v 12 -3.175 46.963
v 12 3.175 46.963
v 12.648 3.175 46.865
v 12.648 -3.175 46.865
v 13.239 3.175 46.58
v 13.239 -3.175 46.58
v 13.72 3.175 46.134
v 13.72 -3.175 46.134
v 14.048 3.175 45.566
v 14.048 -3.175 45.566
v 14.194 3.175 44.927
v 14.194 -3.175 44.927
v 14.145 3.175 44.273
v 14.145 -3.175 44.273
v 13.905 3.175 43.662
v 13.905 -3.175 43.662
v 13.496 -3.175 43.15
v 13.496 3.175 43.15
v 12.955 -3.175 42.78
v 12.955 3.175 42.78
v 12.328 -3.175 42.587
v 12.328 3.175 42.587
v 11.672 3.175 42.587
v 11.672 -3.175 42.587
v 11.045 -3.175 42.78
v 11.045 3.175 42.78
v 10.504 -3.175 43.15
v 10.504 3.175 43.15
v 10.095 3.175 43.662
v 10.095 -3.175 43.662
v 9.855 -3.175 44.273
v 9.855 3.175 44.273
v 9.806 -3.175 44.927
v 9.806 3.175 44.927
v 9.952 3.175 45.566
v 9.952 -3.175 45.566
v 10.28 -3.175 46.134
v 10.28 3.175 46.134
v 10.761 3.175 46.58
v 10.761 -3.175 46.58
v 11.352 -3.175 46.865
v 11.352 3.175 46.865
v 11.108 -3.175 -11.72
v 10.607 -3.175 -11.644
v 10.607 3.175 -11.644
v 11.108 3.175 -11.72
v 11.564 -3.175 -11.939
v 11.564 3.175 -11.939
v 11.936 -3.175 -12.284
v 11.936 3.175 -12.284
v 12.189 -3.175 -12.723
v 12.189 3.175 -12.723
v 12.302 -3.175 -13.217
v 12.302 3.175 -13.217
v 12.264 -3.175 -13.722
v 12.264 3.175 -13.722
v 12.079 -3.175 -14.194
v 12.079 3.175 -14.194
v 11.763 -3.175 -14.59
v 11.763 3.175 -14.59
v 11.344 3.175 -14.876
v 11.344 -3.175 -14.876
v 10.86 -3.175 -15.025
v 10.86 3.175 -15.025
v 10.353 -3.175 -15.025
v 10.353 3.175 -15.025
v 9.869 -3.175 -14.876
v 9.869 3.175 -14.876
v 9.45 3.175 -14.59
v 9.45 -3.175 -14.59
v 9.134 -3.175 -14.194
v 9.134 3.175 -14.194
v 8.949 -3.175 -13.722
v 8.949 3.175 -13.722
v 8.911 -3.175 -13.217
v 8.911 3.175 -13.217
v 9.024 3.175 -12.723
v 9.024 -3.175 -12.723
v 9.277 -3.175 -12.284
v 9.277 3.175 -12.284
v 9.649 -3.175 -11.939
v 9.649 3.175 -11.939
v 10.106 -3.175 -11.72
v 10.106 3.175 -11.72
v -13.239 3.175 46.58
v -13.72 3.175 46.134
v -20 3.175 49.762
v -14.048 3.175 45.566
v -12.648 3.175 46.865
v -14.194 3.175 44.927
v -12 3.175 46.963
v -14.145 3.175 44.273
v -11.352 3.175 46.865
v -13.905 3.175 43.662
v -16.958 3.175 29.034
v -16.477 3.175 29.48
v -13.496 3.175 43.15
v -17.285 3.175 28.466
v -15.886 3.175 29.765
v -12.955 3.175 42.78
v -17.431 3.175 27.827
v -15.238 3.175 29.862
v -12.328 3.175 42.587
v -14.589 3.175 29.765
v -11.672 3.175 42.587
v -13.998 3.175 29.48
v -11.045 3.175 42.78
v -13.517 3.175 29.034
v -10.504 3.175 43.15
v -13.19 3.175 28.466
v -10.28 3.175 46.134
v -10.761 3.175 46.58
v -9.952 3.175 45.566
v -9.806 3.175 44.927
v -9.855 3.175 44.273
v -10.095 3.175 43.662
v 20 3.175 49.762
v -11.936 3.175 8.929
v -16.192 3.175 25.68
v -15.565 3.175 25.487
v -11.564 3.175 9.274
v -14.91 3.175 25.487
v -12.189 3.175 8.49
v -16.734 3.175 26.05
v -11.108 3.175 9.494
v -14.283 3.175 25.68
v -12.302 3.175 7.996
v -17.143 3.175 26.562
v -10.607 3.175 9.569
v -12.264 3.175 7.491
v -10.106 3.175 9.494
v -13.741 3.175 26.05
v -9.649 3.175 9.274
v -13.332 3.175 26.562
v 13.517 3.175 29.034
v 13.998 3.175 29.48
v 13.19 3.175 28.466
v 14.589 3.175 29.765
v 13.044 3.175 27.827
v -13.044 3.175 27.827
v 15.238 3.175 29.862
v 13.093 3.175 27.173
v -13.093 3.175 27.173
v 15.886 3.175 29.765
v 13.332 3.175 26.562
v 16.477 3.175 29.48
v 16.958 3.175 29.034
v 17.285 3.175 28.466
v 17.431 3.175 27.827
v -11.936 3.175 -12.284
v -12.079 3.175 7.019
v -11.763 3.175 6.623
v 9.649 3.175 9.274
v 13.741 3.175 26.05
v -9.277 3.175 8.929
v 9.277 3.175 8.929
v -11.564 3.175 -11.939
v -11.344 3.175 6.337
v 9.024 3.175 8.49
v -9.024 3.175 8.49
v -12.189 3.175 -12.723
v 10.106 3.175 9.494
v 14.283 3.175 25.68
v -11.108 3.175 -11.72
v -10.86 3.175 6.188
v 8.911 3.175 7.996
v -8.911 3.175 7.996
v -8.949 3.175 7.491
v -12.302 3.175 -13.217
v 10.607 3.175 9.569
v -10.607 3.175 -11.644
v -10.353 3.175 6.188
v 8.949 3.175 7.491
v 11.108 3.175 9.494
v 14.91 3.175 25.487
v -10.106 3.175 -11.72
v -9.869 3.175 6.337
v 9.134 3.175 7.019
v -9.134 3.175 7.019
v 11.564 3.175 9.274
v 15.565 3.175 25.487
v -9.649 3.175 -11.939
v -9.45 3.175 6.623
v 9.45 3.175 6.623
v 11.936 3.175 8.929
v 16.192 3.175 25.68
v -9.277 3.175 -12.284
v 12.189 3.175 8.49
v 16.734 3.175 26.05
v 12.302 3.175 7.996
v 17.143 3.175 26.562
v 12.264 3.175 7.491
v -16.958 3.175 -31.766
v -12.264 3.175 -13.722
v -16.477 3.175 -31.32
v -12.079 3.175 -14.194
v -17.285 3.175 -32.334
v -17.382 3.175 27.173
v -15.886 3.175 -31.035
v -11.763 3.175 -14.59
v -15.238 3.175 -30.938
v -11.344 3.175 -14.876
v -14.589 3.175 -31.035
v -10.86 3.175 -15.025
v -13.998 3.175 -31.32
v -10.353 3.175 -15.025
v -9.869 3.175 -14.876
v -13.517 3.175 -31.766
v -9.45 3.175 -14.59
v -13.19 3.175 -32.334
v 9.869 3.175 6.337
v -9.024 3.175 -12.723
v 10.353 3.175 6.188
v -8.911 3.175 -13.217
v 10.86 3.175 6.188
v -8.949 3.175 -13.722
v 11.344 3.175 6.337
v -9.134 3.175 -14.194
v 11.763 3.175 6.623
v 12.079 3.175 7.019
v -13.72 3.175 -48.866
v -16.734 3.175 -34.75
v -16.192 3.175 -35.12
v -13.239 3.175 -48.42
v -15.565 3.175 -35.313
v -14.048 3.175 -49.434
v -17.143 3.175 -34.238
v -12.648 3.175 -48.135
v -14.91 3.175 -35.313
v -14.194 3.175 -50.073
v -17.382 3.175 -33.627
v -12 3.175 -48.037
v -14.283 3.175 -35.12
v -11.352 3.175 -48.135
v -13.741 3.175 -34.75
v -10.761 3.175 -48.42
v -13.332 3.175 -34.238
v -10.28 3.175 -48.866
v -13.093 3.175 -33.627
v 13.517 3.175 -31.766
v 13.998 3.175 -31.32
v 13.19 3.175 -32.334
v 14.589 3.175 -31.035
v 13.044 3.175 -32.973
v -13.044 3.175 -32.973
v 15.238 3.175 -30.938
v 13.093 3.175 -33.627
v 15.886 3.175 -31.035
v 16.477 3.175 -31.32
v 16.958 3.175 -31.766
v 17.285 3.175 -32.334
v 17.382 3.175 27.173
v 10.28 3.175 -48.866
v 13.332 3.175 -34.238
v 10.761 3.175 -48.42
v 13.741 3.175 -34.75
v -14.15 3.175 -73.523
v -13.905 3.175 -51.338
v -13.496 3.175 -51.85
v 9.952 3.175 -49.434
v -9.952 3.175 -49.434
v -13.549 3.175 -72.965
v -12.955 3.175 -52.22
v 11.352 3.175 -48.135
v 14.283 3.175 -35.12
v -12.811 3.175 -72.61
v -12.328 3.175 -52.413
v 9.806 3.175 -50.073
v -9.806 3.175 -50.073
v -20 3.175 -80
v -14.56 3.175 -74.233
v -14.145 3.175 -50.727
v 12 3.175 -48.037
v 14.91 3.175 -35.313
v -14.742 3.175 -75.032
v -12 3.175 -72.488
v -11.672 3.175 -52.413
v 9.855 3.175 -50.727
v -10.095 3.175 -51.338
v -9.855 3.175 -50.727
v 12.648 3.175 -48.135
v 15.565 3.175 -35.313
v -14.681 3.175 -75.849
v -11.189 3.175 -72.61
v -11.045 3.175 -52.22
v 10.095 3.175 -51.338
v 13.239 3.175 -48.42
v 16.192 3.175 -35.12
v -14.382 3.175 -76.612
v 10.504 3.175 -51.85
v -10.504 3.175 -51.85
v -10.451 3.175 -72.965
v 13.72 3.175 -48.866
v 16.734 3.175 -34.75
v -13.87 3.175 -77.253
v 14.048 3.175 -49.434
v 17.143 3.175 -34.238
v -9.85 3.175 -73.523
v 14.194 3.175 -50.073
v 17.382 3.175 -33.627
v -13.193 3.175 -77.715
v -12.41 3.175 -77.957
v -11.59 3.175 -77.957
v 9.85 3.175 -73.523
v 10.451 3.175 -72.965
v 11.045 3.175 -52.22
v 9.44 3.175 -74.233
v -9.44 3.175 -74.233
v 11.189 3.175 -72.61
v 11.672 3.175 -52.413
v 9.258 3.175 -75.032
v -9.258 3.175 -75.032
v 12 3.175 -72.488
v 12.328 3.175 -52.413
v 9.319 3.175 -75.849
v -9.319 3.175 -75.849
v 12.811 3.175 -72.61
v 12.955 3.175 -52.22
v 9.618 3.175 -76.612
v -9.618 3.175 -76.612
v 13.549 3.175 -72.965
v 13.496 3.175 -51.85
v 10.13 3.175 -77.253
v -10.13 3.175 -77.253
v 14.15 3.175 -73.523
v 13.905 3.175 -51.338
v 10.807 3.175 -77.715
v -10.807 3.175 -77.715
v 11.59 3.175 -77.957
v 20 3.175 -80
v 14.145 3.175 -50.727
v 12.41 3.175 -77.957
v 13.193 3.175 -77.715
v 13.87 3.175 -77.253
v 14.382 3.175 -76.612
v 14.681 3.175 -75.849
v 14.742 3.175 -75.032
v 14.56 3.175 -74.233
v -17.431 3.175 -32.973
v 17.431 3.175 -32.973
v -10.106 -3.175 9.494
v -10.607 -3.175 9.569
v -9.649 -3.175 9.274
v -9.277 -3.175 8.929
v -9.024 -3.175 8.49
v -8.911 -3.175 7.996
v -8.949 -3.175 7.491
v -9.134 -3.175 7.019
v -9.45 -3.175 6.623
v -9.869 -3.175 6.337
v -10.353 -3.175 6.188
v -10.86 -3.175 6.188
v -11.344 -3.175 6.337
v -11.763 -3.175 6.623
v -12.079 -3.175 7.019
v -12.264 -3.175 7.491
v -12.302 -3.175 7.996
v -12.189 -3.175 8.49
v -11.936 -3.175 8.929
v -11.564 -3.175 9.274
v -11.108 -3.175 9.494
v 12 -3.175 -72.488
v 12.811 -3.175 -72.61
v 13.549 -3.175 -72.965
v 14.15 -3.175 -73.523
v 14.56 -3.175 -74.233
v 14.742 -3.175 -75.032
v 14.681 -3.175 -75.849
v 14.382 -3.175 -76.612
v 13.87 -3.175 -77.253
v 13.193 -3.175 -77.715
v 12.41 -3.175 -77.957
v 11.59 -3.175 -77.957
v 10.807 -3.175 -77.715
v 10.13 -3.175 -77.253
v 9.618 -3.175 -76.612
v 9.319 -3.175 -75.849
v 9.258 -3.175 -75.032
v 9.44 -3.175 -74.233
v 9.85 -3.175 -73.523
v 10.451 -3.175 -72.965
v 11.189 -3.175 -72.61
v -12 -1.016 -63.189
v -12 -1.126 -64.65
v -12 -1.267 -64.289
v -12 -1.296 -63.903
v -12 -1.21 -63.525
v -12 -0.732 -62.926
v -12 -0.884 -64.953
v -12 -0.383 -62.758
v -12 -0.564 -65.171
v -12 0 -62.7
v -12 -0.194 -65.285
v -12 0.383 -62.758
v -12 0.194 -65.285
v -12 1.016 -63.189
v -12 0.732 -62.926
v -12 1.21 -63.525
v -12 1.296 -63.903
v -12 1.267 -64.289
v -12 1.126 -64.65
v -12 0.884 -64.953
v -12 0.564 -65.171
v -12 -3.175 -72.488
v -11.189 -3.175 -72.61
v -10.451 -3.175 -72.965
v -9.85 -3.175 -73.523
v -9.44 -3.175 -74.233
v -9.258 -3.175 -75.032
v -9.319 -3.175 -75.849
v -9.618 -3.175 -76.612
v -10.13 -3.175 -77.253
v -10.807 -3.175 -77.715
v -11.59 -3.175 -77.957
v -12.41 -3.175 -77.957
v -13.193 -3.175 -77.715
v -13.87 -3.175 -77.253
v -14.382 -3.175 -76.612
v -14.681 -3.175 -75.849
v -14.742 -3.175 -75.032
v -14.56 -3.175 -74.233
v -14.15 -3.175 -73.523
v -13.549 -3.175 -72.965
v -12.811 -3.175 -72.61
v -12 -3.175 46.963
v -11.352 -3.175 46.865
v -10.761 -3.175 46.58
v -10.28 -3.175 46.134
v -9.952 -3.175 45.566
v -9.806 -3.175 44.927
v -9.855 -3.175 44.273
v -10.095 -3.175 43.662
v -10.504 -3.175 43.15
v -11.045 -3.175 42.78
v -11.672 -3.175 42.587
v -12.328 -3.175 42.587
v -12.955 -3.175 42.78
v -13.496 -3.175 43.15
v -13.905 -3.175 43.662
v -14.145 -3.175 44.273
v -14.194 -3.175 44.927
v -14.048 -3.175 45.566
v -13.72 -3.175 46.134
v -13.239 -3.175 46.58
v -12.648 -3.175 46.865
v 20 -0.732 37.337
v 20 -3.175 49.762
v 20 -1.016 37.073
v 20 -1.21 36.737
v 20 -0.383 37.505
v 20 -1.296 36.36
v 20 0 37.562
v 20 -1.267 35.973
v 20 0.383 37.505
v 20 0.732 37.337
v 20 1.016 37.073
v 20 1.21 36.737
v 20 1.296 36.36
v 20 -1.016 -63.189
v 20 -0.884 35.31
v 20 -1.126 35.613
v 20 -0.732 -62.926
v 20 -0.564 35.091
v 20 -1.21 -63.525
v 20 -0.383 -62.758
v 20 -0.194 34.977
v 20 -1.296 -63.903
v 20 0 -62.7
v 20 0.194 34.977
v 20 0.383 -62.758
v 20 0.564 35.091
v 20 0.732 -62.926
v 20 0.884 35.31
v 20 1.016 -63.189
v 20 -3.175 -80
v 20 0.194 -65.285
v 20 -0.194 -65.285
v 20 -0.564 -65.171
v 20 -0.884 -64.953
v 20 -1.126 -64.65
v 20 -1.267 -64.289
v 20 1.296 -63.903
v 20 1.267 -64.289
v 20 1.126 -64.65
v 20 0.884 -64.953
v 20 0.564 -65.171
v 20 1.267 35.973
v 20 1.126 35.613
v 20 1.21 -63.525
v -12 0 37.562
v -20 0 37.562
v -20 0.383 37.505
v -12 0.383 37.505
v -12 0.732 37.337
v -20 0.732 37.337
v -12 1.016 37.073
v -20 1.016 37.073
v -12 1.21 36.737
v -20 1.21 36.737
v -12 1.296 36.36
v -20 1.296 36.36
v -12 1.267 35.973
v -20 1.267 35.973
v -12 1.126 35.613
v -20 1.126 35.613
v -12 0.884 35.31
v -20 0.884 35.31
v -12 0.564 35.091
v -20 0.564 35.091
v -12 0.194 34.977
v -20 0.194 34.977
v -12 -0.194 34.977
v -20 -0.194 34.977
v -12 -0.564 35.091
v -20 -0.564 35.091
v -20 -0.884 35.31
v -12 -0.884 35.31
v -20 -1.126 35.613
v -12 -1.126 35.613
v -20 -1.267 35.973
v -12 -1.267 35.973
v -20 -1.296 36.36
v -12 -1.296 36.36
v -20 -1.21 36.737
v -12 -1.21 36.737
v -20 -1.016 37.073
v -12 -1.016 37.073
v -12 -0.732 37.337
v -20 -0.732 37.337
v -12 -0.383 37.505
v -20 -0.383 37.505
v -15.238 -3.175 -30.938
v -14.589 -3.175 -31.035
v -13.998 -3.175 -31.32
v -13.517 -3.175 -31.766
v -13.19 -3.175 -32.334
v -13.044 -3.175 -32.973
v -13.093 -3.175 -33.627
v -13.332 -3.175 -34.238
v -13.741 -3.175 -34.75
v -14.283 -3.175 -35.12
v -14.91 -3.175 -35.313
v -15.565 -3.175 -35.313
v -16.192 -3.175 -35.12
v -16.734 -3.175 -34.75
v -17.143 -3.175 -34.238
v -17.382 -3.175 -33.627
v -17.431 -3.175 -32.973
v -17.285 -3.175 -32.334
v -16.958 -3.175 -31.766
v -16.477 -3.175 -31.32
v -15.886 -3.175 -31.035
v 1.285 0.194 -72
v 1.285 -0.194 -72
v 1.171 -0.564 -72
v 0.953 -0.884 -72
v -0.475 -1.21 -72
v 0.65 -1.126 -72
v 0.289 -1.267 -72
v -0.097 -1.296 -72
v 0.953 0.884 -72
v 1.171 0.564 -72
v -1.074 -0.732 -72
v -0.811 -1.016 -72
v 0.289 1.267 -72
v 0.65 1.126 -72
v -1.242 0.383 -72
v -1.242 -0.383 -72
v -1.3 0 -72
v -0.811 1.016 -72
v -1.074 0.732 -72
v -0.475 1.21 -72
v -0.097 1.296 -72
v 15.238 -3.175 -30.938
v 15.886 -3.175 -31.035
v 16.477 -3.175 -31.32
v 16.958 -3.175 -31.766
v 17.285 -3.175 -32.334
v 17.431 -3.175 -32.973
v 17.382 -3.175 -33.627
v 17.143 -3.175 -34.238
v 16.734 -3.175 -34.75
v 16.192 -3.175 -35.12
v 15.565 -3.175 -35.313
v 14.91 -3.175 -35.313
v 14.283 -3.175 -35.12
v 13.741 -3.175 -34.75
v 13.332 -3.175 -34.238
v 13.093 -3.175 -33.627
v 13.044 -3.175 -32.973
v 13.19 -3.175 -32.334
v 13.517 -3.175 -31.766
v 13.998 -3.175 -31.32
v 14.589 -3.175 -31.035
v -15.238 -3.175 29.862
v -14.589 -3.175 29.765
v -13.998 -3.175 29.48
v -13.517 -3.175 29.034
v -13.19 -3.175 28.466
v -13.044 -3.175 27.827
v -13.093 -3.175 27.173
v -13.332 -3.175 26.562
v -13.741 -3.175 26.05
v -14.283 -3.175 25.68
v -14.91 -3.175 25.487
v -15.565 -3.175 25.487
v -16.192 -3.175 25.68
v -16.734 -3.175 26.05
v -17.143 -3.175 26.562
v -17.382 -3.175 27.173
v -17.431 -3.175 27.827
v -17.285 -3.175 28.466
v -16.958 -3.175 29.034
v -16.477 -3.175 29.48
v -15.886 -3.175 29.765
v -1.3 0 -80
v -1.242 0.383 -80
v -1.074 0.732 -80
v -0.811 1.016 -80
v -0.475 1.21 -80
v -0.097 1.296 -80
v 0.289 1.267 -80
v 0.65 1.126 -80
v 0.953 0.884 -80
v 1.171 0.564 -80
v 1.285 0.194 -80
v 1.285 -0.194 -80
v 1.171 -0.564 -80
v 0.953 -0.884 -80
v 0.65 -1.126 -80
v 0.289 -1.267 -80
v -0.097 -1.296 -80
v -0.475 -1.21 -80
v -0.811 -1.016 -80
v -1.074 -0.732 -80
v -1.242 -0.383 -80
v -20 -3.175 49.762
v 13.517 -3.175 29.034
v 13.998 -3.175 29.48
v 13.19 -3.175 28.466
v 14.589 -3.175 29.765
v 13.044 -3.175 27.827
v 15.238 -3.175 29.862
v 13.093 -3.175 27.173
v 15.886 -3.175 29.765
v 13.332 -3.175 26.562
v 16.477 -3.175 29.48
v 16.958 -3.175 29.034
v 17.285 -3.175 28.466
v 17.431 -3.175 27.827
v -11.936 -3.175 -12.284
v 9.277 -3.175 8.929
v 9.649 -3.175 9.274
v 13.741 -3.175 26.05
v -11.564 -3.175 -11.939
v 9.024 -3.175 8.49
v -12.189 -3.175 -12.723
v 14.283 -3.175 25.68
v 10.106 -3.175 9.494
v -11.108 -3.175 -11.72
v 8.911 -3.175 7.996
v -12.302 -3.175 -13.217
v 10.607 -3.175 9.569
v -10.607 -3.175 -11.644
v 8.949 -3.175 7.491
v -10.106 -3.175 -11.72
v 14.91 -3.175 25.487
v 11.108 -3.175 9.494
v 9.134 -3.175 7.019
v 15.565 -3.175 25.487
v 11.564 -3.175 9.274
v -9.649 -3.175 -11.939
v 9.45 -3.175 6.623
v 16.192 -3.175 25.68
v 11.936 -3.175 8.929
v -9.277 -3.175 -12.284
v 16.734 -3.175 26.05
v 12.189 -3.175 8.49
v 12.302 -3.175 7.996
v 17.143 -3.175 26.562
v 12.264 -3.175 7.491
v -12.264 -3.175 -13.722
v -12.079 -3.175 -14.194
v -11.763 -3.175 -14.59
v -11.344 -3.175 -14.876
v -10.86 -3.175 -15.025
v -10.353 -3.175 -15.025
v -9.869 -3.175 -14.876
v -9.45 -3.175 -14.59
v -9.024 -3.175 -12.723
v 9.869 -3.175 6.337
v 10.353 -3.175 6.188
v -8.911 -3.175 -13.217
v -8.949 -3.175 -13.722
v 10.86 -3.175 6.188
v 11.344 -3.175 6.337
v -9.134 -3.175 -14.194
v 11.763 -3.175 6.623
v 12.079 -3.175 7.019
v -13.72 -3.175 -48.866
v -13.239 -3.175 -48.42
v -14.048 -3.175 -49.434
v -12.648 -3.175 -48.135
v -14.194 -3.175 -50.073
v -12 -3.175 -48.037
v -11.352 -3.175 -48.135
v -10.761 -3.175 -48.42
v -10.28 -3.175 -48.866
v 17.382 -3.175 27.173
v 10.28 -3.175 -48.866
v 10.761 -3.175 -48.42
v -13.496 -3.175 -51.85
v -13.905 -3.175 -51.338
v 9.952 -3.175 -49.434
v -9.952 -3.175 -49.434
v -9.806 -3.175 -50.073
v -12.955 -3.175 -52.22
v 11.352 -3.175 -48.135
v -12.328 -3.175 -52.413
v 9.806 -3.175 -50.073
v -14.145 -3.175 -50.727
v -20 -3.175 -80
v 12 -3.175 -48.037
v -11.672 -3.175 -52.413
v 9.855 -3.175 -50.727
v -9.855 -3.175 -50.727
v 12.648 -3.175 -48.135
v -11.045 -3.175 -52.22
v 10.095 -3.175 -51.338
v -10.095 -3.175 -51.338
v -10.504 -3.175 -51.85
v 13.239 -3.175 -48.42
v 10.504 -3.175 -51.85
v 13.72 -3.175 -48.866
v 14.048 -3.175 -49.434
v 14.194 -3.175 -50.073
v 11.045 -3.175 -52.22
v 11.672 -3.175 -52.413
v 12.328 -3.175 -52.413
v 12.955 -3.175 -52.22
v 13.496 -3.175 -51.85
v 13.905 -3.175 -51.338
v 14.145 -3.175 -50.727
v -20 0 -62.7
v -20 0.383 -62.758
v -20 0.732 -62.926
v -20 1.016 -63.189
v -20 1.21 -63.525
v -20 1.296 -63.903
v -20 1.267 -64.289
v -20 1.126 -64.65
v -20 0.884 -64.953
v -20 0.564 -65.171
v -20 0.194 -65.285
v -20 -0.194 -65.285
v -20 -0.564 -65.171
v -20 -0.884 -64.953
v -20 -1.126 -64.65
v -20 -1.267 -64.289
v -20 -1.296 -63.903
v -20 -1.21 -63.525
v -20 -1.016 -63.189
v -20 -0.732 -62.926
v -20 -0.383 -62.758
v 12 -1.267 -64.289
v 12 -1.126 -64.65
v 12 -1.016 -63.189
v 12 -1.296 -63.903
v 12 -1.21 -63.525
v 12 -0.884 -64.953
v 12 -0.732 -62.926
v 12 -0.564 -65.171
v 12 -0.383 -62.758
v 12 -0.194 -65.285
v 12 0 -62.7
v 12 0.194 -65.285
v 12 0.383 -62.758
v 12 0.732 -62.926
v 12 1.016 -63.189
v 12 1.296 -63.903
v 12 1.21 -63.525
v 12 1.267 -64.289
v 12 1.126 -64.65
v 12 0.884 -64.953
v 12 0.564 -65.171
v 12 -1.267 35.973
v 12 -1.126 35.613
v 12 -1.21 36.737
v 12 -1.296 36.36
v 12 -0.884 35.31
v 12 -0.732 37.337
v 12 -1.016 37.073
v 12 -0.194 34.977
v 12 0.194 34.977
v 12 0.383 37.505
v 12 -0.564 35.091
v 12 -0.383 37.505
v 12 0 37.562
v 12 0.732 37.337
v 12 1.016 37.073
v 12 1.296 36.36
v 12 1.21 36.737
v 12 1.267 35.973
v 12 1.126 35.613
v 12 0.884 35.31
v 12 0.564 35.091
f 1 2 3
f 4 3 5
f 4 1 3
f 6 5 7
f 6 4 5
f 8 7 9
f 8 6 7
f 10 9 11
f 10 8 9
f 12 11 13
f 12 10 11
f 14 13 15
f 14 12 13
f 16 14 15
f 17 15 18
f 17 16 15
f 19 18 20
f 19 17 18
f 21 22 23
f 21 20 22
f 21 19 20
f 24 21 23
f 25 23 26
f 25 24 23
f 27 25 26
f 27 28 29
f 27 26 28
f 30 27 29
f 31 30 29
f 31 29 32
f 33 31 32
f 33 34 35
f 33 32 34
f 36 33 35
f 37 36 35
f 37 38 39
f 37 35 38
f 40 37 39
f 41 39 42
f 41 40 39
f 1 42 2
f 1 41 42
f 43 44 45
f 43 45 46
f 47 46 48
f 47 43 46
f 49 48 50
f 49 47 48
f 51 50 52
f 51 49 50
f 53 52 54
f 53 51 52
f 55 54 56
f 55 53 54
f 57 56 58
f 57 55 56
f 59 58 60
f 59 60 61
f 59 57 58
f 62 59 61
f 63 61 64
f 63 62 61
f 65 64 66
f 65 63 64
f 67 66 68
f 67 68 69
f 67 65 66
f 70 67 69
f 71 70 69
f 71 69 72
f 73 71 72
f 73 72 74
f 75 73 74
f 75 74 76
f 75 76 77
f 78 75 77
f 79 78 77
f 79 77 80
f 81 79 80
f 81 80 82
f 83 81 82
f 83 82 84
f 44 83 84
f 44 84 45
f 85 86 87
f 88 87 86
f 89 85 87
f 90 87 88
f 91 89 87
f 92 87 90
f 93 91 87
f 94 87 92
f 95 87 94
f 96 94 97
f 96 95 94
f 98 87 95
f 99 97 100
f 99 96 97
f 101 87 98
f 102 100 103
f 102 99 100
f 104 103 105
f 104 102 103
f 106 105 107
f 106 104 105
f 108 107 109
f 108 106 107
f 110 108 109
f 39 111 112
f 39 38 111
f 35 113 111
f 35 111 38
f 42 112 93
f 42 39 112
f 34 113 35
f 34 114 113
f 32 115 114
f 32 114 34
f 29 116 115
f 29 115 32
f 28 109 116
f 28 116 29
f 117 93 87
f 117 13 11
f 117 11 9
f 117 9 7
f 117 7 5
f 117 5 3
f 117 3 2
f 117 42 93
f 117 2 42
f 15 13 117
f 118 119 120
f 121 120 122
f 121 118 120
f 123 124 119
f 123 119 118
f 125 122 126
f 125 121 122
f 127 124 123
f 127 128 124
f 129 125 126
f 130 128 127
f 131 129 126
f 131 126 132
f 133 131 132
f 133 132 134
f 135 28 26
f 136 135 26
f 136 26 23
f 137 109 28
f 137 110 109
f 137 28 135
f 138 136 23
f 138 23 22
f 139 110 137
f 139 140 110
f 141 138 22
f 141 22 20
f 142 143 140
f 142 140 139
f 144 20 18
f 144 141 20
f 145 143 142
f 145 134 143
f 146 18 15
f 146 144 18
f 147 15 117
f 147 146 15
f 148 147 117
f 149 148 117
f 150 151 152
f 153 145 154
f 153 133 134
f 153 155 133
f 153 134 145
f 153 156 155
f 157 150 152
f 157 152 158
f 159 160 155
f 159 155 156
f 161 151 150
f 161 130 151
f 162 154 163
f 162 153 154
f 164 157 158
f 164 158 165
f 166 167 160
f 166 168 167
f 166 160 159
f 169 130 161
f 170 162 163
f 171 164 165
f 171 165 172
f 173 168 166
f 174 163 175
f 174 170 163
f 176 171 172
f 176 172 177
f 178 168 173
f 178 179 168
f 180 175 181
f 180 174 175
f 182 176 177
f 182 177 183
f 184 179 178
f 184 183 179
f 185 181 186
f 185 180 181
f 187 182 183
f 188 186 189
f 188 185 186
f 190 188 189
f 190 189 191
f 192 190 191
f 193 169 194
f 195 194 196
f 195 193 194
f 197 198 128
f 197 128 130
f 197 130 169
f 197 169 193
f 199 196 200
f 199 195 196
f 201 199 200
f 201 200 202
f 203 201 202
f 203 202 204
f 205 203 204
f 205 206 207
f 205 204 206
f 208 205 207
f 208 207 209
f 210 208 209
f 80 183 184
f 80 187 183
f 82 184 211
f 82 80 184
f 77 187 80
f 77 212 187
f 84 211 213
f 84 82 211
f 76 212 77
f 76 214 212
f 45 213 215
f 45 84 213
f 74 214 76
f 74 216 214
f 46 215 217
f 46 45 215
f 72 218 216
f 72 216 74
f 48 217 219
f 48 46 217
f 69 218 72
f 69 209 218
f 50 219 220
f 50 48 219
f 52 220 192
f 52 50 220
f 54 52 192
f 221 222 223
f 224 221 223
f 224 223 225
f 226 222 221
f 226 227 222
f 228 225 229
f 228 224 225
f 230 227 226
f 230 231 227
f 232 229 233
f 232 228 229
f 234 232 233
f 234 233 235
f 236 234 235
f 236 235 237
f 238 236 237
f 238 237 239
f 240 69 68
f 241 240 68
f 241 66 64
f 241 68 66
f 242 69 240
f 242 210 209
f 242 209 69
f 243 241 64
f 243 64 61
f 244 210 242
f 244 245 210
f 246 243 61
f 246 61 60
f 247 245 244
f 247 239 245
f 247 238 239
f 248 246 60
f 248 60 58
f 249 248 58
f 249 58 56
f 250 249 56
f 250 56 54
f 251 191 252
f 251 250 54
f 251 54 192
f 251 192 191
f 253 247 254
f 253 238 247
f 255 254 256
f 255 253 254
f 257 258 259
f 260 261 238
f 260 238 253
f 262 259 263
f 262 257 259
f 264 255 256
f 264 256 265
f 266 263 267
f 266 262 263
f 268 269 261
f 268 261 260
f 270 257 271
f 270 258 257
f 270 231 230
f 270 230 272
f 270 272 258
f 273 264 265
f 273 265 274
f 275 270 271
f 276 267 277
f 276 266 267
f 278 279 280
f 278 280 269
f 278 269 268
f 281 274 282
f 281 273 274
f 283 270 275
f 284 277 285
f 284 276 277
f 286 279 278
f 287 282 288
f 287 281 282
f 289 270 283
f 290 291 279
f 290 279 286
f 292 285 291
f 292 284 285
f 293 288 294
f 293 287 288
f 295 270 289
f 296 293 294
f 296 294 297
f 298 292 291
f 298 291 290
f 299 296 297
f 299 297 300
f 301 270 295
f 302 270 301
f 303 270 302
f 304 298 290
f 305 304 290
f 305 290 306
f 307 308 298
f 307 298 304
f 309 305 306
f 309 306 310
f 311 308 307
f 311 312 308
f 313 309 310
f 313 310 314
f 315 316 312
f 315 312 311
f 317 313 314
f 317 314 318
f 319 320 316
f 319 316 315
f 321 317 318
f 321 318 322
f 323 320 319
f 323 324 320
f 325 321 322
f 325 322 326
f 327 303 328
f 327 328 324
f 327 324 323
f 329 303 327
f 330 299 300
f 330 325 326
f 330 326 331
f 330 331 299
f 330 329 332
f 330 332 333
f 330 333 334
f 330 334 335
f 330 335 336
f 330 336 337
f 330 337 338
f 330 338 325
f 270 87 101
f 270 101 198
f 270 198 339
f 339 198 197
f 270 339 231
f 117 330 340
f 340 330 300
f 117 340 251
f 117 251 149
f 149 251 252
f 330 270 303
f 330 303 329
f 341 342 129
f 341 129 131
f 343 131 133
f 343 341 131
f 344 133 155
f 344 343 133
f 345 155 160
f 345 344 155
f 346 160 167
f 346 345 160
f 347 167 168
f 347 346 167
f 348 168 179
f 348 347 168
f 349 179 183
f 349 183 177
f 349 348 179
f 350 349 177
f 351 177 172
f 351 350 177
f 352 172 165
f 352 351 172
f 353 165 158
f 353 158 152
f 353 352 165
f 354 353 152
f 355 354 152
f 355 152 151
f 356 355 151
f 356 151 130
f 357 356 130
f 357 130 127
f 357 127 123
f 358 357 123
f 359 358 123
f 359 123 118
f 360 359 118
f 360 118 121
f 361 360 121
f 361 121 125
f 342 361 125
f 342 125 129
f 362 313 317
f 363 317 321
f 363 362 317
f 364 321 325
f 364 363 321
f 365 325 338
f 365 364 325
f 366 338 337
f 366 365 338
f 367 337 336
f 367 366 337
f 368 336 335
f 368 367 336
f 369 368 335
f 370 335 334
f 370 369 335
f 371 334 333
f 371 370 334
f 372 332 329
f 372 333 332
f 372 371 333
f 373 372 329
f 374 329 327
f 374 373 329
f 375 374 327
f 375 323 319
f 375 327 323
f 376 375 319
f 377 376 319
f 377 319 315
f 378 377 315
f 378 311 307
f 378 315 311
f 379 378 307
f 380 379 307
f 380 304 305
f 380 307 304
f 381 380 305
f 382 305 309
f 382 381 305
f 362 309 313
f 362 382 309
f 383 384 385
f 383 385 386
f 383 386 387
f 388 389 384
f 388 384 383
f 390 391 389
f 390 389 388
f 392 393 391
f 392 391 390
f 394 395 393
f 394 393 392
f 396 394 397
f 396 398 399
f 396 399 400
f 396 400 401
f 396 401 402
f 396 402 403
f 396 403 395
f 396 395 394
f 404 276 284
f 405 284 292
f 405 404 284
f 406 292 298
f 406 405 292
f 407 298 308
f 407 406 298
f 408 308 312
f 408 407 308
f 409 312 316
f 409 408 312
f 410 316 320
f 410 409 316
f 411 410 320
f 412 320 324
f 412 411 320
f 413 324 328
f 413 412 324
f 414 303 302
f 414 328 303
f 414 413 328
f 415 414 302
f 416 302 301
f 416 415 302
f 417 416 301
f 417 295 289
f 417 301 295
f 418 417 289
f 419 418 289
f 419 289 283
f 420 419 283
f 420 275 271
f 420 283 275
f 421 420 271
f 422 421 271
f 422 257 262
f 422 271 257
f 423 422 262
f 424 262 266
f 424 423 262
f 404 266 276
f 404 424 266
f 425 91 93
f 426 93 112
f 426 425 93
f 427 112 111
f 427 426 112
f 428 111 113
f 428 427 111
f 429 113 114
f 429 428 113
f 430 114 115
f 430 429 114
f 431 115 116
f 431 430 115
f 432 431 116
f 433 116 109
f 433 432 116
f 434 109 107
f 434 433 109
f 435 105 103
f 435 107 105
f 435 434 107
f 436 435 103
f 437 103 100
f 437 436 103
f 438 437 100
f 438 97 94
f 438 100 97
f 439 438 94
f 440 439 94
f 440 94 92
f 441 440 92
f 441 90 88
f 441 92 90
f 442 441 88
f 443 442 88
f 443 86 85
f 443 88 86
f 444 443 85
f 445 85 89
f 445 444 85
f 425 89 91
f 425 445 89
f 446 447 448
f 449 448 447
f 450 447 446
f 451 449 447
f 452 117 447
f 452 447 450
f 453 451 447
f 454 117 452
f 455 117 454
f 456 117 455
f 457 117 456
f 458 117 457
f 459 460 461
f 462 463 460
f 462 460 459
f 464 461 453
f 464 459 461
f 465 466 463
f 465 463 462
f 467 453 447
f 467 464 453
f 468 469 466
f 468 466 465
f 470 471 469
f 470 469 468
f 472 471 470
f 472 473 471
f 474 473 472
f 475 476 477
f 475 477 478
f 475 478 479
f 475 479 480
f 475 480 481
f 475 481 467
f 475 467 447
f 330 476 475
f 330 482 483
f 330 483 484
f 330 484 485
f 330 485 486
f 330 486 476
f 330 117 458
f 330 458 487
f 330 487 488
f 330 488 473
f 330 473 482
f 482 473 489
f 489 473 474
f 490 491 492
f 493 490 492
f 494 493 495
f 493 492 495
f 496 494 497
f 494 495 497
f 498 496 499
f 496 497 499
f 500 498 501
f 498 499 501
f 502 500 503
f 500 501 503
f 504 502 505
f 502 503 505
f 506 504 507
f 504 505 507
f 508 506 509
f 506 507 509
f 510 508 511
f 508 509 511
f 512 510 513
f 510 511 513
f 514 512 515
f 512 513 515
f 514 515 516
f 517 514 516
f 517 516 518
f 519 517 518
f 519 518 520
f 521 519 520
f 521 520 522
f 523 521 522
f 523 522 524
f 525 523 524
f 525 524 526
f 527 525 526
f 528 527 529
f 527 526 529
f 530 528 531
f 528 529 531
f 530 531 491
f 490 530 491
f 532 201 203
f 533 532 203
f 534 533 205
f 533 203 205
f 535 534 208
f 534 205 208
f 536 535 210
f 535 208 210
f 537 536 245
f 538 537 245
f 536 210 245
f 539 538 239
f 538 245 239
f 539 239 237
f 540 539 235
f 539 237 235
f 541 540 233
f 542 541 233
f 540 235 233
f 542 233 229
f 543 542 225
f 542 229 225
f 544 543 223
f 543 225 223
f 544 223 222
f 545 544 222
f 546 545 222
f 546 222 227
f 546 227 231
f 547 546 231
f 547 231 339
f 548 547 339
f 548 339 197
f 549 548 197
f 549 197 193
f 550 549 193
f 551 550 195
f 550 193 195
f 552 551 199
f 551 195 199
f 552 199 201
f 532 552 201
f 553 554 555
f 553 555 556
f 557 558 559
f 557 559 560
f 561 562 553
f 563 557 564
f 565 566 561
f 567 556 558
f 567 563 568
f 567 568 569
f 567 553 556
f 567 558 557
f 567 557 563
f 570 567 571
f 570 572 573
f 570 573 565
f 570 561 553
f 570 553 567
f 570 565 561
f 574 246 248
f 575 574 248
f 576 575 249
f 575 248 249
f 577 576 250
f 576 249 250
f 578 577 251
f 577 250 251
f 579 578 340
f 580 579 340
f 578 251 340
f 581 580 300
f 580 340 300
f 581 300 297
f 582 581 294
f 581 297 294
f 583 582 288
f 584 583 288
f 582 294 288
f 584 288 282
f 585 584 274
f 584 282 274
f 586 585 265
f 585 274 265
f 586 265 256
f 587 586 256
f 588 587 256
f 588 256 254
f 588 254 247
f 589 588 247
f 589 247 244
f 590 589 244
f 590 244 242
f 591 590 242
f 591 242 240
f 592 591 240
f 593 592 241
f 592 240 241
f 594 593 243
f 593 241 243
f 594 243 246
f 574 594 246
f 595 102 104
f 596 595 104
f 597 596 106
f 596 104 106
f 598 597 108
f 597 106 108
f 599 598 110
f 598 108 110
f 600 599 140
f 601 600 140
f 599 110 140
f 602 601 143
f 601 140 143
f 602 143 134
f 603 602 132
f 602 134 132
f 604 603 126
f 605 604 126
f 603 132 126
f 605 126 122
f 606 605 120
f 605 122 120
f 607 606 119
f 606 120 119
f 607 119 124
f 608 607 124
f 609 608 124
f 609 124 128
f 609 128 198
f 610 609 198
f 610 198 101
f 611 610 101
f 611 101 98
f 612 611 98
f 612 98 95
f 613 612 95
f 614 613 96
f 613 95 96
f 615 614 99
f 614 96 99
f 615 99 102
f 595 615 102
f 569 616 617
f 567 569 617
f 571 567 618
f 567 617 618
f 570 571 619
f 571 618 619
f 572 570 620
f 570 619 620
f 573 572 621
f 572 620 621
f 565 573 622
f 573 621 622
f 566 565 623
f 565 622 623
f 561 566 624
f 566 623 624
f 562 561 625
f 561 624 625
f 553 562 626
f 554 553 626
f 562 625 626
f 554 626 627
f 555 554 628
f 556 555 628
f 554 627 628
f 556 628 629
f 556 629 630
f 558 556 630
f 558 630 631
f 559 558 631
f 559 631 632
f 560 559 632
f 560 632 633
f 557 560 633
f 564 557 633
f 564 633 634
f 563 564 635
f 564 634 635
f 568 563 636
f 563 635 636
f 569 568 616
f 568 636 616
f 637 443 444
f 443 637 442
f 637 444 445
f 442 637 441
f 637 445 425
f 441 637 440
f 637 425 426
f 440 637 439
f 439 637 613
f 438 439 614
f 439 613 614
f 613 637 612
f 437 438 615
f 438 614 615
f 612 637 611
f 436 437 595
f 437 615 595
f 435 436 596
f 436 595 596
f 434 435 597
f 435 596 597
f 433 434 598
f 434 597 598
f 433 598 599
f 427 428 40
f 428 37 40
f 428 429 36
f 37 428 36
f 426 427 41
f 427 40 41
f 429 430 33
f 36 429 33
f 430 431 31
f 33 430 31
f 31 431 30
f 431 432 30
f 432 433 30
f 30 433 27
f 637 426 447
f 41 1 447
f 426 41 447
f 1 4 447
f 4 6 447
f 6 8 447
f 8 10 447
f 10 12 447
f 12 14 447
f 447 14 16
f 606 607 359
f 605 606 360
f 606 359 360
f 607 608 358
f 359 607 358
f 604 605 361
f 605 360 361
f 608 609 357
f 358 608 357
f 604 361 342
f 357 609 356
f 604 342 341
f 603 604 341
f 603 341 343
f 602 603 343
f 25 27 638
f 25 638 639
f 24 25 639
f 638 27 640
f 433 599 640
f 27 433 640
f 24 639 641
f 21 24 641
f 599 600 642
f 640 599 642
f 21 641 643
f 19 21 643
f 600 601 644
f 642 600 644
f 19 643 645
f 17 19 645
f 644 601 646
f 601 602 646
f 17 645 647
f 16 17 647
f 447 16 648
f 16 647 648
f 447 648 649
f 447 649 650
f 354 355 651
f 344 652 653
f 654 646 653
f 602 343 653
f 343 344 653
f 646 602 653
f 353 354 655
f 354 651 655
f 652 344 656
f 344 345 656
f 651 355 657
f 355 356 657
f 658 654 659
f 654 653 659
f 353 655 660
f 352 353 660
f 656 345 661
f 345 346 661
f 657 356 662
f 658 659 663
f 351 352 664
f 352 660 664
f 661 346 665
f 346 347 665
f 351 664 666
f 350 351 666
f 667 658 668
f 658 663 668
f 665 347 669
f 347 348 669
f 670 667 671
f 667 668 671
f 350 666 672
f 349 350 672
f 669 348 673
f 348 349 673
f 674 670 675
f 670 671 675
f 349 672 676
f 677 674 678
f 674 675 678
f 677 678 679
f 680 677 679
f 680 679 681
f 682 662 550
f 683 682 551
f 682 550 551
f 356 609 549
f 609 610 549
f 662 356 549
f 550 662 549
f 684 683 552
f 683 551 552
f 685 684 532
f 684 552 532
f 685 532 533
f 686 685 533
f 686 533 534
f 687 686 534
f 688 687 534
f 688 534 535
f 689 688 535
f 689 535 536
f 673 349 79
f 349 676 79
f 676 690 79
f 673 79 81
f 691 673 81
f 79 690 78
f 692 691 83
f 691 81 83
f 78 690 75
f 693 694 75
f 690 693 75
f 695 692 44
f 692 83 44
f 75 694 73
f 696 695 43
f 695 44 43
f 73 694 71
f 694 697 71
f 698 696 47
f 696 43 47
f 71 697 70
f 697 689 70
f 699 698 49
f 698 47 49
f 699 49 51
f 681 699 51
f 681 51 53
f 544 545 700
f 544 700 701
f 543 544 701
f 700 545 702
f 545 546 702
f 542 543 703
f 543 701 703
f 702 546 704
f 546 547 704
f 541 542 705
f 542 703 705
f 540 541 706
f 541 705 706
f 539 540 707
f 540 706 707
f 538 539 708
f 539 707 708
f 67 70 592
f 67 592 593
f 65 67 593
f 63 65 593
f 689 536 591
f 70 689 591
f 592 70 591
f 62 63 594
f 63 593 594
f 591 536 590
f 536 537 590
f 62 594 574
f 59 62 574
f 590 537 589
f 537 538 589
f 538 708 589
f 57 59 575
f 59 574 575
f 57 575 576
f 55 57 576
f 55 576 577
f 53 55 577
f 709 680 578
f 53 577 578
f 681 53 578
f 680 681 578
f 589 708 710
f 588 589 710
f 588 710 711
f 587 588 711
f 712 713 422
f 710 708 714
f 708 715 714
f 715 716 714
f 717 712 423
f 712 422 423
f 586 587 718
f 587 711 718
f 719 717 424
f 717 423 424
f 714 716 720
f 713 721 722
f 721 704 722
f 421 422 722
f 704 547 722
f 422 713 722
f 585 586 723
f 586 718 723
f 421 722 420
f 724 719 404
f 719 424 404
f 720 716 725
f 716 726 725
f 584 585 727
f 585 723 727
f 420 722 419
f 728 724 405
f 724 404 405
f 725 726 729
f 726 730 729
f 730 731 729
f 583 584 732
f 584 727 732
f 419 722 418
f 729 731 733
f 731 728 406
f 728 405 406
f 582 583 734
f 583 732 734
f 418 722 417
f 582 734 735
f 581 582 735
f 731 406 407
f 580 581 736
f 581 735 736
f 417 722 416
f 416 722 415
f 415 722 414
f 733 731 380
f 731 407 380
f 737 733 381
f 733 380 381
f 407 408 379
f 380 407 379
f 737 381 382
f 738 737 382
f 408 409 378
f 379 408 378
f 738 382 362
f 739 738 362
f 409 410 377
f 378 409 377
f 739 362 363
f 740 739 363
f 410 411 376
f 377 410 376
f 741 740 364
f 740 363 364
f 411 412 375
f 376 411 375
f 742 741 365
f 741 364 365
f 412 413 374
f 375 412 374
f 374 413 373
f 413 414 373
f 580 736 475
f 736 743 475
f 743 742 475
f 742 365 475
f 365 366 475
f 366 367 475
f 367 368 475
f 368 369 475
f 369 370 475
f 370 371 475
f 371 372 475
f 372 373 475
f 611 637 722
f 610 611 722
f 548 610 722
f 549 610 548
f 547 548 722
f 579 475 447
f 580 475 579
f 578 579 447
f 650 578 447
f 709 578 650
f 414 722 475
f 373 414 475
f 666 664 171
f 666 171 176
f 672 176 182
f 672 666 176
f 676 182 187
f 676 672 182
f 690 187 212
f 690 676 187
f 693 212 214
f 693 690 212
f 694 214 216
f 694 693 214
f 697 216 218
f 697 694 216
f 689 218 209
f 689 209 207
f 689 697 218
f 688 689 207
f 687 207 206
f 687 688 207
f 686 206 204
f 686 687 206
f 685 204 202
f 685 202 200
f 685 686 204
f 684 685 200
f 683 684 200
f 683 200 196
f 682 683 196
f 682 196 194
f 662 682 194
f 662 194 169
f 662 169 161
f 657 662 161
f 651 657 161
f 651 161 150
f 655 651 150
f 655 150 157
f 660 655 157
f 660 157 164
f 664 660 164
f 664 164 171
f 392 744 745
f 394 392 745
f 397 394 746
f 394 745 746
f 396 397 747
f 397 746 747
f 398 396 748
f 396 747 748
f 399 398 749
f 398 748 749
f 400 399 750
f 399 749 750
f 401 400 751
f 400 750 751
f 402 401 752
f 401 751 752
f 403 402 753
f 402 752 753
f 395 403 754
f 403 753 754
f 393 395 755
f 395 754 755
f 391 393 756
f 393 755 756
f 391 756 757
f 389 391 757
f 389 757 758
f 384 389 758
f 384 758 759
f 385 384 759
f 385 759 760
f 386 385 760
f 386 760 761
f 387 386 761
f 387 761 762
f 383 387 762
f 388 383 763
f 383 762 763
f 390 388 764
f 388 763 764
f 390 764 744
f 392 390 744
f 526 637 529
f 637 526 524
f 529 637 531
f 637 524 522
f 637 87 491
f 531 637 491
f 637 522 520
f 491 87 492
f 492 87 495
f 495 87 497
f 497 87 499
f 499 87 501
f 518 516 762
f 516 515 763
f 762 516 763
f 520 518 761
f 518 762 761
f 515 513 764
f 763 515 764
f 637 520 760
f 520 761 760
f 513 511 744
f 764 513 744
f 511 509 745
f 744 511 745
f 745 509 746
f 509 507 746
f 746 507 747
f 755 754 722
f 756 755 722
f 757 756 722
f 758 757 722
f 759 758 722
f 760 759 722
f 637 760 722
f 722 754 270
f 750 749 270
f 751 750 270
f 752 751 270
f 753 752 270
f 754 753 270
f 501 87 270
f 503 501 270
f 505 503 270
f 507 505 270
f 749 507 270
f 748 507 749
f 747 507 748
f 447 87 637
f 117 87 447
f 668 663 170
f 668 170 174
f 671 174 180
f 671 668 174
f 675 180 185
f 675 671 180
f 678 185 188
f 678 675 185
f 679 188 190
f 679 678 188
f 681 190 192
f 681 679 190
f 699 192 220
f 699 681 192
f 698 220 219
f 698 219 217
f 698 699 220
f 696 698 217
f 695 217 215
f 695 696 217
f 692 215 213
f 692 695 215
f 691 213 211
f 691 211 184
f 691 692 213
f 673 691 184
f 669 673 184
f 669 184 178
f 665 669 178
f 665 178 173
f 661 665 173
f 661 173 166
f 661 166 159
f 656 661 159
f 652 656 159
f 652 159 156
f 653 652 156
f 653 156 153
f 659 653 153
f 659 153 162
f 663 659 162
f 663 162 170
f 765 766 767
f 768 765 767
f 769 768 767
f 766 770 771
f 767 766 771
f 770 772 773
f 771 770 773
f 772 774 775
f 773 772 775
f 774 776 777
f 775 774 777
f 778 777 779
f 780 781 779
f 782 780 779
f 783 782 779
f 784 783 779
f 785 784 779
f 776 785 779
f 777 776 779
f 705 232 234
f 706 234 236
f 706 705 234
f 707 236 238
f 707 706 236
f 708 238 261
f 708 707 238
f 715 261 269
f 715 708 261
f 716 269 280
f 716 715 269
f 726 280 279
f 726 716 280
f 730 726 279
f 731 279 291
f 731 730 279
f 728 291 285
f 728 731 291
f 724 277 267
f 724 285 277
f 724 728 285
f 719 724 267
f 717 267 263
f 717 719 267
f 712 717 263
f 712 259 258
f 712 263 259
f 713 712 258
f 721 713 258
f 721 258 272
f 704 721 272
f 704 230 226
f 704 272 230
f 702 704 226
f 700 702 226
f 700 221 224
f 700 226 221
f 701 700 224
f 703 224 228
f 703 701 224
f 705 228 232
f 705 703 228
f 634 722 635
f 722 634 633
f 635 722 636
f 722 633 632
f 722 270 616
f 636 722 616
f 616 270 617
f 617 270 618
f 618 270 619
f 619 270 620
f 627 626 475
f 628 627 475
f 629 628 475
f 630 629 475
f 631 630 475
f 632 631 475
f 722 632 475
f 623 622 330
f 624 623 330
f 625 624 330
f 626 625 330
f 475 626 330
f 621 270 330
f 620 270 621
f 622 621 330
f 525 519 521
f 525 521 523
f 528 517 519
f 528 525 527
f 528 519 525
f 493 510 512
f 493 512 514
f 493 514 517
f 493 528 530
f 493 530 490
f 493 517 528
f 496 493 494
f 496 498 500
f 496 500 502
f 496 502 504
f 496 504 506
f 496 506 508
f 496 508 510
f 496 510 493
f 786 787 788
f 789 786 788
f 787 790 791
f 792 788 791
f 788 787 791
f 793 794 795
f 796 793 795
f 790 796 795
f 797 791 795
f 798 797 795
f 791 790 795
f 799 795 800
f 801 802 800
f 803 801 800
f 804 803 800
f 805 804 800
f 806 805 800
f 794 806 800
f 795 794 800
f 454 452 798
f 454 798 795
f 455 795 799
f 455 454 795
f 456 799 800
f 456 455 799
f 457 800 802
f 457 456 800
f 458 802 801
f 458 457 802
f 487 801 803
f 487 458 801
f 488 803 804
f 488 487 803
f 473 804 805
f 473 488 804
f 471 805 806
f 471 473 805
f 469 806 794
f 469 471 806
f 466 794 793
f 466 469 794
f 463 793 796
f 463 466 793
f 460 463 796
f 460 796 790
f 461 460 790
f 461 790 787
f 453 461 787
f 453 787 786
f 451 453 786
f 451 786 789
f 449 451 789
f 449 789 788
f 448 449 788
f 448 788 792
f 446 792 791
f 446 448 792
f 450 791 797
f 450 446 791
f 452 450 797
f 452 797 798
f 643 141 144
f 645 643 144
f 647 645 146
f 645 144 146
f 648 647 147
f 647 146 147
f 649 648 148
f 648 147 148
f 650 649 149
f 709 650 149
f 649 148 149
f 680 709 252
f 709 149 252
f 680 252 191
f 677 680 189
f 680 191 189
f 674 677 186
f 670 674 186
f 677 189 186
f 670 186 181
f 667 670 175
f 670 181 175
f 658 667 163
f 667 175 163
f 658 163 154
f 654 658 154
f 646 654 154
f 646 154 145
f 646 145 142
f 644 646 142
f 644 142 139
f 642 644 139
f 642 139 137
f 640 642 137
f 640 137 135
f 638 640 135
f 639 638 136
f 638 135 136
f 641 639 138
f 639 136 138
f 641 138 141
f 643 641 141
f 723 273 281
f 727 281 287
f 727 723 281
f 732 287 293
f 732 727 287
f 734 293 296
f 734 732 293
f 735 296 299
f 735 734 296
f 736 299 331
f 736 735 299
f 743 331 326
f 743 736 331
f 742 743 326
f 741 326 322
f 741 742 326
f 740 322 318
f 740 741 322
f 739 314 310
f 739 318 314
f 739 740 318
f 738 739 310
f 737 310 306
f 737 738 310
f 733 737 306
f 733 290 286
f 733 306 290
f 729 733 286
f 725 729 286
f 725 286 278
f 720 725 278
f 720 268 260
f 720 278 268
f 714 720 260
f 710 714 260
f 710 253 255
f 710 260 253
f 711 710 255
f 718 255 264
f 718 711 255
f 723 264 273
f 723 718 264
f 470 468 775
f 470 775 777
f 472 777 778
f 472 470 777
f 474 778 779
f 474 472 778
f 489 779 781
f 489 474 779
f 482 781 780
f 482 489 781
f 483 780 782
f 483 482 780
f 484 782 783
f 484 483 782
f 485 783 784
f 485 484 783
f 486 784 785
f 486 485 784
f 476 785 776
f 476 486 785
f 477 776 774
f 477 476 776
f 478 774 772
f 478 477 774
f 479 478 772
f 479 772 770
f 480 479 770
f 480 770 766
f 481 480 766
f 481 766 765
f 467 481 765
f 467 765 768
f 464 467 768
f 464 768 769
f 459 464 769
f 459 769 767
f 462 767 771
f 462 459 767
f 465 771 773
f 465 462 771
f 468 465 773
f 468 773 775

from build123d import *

# Parameters (mm, degrees)
SKETCH1_W               = 40
SKETCH1_H               = 160
BOSS_EXTRUDE1_DEPTH     = 3.175
M4_5_THROUGH_DEPTH      = 6.35
M4_5_THROUGH_DEPTH_BACK = 3.175
SKETCH3_R               = 2.75
SKETCH3_R_2             = 2.2
SKETCH4_R               = 1.3
M3_DRILL_DEPTH          = 8
SKETCH5_R               = 2.2
M4_THROUGH_DEPTH        = 6.35
M4_DRILL_DEPTH          = 3.175
M4_DRILL_DEPTH_BACK     = 10
SKETCH6_R               = 1.7
SKETCH7_W               = 40
SKETCH7_H               = 30.2375
CUT_EXTRUDE2_DEPTH      = 6.35
SKETCH8_R               = 1.3
CUT_EXTRUDE3_DEPTH      = 8


with BuildPart() as part:
    # Sketch1 → Boss-Extrude1 (new, symmetric)
    with BuildSketch(Plane(origin=(0, 0, 0), x_dir=(1, 0, 0), z_dir=(0, 1, 0))):
        Rectangle(SKETCH1_W, SKETCH1_H)
    extrude(amount=BOSS_EXTRUDE1_DEPTH, both=True)

    # Sketch3 → M4/5_through (cut, two sides: drawn at the far end of the back side and taken through both)
    with BuildSketch(Plane(origin=(0, 0, 0), x_dir=(1, 0, 0), z_dir=(0, 1, 0)).offset(-M4_5_THROUGH_DEPTH_BACK)):
        with Locations(Location((12, 75.2375, 0), (0, 0, 270))):
            Circle(SKETCH3_R)
        with Locations(Location((12, 50.2375, 0), (0, 0, 270))):
            Circle(SKETCH3_R_2)
        with Locations(Location((-12, 50.2375, 0), (0, 0, 270))):
            Circle(SKETCH3_R_2)
        with Locations(Location((-12, 75.2375, 0), (0, 0, 270))):
            Circle(SKETCH3_R)
        with Locations(Location((-12, -44.7625, 0), (0, 0, 270))):
            Circle(SKETCH3_R_2)
        with Locations(Location((12, -44.7625, 0), (0, 0, 270))):
            Circle(SKETCH3_R_2)
    extrude(amount=M4_5_THROUGH_DEPTH + M4_5_THROUGH_DEPTH_BACK, mode=Mode.SUBTRACT)

    # Sketch4 → M3_DRILL (cut)
    with BuildSketch(Plane(origin=(0, 0, -80), x_dir=(-1, 0, 0), z_dir=(0, 0, -1))):
        Circle(SKETCH4_R)
    extrude(amount=-M3_DRILL_DEPTH, mode=Mode.SUBTRACT)

    # Sketch5 → M4_through (cut)
    with BuildSketch(Plane(origin=(0, 3.175, 0), x_dir=(1, 0, 0), z_dir=(0, 1, 0))):
        with Locations(Location((-15.2375, -27.6625, 0), (0, 0, 270))):
            Circle(SKETCH5_R)
        with Locations(Location((15.2375, -27.6625, 0), (0, 0, 270))):
            Circle(SKETCH5_R)
        with Locations(Location((15.2375, 33.1375, 0), (0, 0, 270))):
            Circle(SKETCH5_R)
        with Locations(Location((-15.2375, 33.1375, 0), (0, 0, 270))):
            Circle(SKETCH5_R)
    extrude(amount=-M4_THROUGH_DEPTH, mode=Mode.SUBTRACT)

    # Sketch6 → M4_Drill (cut, two sides: drawn at the far end of the back side and taken through both)
    with BuildSketch(Plane(origin=(0, 0, 0), x_dir=(1, 0, 0), z_dir=(0, 1, 0)).offset(-M4_DRILL_DEPTH_BACK)):
        with Locations(Location((-10.606601718, 13.344101718, 0), (0, 0, 270))):
            Circle(SKETCH6_R)
        with Locations(Location((10.606601718, 13.344101718, 0), (0, 0, 270))):
            Circle(SKETCH6_R)
        with Locations(Location((10.606601718, -7.869101718, 0), (0, 0, 270))):
            Circle(SKETCH6_R)
        with Locations(Location((-10.606601718, -7.869101718, 0), (0, 0, 270))):
            Circle(SKETCH6_R)
    extrude(amount=M4_DRILL_DEPTH + M4_DRILL_DEPTH_BACK, mode=Mode.SUBTRACT)

    # Sketch7 → Cut-Extrude2 (cut)
    with BuildSketch(Plane(origin=(0, 3.175, 0), x_dir=(1, 0, 0), z_dir=(0, 1, 0))):
        with Locations((0, -64.88125)):
            Rectangle(SKETCH7_W, SKETCH7_H)
    extrude(amount=-CUT_EXTRUDE2_DEPTH, mode=Mode.SUBTRACT)

    # Sketch8 → Cut-Extrude3 (cut)
    with BuildSketch(Plane.ZY.offset(20)):
        with Locations((36.2625, 0)):
            Circle(SKETCH8_R)
        with Locations((-64, 0)):
            Circle(SKETCH8_R)
    cut_extrude3 = extrude(amount=-CUT_EXTRUDE3_DEPTH, mode=Mode.SUBTRACT)

    # Mirror1: Cut-Extrude3 across plane
    add(cut_extrude3.mirror(Plane(origin=(0, 0, 0), x_dir=(0, 0, 1), z_dir=(1, 0, 0))), mode=Mode.SUBTRACT)


solid = part.part
